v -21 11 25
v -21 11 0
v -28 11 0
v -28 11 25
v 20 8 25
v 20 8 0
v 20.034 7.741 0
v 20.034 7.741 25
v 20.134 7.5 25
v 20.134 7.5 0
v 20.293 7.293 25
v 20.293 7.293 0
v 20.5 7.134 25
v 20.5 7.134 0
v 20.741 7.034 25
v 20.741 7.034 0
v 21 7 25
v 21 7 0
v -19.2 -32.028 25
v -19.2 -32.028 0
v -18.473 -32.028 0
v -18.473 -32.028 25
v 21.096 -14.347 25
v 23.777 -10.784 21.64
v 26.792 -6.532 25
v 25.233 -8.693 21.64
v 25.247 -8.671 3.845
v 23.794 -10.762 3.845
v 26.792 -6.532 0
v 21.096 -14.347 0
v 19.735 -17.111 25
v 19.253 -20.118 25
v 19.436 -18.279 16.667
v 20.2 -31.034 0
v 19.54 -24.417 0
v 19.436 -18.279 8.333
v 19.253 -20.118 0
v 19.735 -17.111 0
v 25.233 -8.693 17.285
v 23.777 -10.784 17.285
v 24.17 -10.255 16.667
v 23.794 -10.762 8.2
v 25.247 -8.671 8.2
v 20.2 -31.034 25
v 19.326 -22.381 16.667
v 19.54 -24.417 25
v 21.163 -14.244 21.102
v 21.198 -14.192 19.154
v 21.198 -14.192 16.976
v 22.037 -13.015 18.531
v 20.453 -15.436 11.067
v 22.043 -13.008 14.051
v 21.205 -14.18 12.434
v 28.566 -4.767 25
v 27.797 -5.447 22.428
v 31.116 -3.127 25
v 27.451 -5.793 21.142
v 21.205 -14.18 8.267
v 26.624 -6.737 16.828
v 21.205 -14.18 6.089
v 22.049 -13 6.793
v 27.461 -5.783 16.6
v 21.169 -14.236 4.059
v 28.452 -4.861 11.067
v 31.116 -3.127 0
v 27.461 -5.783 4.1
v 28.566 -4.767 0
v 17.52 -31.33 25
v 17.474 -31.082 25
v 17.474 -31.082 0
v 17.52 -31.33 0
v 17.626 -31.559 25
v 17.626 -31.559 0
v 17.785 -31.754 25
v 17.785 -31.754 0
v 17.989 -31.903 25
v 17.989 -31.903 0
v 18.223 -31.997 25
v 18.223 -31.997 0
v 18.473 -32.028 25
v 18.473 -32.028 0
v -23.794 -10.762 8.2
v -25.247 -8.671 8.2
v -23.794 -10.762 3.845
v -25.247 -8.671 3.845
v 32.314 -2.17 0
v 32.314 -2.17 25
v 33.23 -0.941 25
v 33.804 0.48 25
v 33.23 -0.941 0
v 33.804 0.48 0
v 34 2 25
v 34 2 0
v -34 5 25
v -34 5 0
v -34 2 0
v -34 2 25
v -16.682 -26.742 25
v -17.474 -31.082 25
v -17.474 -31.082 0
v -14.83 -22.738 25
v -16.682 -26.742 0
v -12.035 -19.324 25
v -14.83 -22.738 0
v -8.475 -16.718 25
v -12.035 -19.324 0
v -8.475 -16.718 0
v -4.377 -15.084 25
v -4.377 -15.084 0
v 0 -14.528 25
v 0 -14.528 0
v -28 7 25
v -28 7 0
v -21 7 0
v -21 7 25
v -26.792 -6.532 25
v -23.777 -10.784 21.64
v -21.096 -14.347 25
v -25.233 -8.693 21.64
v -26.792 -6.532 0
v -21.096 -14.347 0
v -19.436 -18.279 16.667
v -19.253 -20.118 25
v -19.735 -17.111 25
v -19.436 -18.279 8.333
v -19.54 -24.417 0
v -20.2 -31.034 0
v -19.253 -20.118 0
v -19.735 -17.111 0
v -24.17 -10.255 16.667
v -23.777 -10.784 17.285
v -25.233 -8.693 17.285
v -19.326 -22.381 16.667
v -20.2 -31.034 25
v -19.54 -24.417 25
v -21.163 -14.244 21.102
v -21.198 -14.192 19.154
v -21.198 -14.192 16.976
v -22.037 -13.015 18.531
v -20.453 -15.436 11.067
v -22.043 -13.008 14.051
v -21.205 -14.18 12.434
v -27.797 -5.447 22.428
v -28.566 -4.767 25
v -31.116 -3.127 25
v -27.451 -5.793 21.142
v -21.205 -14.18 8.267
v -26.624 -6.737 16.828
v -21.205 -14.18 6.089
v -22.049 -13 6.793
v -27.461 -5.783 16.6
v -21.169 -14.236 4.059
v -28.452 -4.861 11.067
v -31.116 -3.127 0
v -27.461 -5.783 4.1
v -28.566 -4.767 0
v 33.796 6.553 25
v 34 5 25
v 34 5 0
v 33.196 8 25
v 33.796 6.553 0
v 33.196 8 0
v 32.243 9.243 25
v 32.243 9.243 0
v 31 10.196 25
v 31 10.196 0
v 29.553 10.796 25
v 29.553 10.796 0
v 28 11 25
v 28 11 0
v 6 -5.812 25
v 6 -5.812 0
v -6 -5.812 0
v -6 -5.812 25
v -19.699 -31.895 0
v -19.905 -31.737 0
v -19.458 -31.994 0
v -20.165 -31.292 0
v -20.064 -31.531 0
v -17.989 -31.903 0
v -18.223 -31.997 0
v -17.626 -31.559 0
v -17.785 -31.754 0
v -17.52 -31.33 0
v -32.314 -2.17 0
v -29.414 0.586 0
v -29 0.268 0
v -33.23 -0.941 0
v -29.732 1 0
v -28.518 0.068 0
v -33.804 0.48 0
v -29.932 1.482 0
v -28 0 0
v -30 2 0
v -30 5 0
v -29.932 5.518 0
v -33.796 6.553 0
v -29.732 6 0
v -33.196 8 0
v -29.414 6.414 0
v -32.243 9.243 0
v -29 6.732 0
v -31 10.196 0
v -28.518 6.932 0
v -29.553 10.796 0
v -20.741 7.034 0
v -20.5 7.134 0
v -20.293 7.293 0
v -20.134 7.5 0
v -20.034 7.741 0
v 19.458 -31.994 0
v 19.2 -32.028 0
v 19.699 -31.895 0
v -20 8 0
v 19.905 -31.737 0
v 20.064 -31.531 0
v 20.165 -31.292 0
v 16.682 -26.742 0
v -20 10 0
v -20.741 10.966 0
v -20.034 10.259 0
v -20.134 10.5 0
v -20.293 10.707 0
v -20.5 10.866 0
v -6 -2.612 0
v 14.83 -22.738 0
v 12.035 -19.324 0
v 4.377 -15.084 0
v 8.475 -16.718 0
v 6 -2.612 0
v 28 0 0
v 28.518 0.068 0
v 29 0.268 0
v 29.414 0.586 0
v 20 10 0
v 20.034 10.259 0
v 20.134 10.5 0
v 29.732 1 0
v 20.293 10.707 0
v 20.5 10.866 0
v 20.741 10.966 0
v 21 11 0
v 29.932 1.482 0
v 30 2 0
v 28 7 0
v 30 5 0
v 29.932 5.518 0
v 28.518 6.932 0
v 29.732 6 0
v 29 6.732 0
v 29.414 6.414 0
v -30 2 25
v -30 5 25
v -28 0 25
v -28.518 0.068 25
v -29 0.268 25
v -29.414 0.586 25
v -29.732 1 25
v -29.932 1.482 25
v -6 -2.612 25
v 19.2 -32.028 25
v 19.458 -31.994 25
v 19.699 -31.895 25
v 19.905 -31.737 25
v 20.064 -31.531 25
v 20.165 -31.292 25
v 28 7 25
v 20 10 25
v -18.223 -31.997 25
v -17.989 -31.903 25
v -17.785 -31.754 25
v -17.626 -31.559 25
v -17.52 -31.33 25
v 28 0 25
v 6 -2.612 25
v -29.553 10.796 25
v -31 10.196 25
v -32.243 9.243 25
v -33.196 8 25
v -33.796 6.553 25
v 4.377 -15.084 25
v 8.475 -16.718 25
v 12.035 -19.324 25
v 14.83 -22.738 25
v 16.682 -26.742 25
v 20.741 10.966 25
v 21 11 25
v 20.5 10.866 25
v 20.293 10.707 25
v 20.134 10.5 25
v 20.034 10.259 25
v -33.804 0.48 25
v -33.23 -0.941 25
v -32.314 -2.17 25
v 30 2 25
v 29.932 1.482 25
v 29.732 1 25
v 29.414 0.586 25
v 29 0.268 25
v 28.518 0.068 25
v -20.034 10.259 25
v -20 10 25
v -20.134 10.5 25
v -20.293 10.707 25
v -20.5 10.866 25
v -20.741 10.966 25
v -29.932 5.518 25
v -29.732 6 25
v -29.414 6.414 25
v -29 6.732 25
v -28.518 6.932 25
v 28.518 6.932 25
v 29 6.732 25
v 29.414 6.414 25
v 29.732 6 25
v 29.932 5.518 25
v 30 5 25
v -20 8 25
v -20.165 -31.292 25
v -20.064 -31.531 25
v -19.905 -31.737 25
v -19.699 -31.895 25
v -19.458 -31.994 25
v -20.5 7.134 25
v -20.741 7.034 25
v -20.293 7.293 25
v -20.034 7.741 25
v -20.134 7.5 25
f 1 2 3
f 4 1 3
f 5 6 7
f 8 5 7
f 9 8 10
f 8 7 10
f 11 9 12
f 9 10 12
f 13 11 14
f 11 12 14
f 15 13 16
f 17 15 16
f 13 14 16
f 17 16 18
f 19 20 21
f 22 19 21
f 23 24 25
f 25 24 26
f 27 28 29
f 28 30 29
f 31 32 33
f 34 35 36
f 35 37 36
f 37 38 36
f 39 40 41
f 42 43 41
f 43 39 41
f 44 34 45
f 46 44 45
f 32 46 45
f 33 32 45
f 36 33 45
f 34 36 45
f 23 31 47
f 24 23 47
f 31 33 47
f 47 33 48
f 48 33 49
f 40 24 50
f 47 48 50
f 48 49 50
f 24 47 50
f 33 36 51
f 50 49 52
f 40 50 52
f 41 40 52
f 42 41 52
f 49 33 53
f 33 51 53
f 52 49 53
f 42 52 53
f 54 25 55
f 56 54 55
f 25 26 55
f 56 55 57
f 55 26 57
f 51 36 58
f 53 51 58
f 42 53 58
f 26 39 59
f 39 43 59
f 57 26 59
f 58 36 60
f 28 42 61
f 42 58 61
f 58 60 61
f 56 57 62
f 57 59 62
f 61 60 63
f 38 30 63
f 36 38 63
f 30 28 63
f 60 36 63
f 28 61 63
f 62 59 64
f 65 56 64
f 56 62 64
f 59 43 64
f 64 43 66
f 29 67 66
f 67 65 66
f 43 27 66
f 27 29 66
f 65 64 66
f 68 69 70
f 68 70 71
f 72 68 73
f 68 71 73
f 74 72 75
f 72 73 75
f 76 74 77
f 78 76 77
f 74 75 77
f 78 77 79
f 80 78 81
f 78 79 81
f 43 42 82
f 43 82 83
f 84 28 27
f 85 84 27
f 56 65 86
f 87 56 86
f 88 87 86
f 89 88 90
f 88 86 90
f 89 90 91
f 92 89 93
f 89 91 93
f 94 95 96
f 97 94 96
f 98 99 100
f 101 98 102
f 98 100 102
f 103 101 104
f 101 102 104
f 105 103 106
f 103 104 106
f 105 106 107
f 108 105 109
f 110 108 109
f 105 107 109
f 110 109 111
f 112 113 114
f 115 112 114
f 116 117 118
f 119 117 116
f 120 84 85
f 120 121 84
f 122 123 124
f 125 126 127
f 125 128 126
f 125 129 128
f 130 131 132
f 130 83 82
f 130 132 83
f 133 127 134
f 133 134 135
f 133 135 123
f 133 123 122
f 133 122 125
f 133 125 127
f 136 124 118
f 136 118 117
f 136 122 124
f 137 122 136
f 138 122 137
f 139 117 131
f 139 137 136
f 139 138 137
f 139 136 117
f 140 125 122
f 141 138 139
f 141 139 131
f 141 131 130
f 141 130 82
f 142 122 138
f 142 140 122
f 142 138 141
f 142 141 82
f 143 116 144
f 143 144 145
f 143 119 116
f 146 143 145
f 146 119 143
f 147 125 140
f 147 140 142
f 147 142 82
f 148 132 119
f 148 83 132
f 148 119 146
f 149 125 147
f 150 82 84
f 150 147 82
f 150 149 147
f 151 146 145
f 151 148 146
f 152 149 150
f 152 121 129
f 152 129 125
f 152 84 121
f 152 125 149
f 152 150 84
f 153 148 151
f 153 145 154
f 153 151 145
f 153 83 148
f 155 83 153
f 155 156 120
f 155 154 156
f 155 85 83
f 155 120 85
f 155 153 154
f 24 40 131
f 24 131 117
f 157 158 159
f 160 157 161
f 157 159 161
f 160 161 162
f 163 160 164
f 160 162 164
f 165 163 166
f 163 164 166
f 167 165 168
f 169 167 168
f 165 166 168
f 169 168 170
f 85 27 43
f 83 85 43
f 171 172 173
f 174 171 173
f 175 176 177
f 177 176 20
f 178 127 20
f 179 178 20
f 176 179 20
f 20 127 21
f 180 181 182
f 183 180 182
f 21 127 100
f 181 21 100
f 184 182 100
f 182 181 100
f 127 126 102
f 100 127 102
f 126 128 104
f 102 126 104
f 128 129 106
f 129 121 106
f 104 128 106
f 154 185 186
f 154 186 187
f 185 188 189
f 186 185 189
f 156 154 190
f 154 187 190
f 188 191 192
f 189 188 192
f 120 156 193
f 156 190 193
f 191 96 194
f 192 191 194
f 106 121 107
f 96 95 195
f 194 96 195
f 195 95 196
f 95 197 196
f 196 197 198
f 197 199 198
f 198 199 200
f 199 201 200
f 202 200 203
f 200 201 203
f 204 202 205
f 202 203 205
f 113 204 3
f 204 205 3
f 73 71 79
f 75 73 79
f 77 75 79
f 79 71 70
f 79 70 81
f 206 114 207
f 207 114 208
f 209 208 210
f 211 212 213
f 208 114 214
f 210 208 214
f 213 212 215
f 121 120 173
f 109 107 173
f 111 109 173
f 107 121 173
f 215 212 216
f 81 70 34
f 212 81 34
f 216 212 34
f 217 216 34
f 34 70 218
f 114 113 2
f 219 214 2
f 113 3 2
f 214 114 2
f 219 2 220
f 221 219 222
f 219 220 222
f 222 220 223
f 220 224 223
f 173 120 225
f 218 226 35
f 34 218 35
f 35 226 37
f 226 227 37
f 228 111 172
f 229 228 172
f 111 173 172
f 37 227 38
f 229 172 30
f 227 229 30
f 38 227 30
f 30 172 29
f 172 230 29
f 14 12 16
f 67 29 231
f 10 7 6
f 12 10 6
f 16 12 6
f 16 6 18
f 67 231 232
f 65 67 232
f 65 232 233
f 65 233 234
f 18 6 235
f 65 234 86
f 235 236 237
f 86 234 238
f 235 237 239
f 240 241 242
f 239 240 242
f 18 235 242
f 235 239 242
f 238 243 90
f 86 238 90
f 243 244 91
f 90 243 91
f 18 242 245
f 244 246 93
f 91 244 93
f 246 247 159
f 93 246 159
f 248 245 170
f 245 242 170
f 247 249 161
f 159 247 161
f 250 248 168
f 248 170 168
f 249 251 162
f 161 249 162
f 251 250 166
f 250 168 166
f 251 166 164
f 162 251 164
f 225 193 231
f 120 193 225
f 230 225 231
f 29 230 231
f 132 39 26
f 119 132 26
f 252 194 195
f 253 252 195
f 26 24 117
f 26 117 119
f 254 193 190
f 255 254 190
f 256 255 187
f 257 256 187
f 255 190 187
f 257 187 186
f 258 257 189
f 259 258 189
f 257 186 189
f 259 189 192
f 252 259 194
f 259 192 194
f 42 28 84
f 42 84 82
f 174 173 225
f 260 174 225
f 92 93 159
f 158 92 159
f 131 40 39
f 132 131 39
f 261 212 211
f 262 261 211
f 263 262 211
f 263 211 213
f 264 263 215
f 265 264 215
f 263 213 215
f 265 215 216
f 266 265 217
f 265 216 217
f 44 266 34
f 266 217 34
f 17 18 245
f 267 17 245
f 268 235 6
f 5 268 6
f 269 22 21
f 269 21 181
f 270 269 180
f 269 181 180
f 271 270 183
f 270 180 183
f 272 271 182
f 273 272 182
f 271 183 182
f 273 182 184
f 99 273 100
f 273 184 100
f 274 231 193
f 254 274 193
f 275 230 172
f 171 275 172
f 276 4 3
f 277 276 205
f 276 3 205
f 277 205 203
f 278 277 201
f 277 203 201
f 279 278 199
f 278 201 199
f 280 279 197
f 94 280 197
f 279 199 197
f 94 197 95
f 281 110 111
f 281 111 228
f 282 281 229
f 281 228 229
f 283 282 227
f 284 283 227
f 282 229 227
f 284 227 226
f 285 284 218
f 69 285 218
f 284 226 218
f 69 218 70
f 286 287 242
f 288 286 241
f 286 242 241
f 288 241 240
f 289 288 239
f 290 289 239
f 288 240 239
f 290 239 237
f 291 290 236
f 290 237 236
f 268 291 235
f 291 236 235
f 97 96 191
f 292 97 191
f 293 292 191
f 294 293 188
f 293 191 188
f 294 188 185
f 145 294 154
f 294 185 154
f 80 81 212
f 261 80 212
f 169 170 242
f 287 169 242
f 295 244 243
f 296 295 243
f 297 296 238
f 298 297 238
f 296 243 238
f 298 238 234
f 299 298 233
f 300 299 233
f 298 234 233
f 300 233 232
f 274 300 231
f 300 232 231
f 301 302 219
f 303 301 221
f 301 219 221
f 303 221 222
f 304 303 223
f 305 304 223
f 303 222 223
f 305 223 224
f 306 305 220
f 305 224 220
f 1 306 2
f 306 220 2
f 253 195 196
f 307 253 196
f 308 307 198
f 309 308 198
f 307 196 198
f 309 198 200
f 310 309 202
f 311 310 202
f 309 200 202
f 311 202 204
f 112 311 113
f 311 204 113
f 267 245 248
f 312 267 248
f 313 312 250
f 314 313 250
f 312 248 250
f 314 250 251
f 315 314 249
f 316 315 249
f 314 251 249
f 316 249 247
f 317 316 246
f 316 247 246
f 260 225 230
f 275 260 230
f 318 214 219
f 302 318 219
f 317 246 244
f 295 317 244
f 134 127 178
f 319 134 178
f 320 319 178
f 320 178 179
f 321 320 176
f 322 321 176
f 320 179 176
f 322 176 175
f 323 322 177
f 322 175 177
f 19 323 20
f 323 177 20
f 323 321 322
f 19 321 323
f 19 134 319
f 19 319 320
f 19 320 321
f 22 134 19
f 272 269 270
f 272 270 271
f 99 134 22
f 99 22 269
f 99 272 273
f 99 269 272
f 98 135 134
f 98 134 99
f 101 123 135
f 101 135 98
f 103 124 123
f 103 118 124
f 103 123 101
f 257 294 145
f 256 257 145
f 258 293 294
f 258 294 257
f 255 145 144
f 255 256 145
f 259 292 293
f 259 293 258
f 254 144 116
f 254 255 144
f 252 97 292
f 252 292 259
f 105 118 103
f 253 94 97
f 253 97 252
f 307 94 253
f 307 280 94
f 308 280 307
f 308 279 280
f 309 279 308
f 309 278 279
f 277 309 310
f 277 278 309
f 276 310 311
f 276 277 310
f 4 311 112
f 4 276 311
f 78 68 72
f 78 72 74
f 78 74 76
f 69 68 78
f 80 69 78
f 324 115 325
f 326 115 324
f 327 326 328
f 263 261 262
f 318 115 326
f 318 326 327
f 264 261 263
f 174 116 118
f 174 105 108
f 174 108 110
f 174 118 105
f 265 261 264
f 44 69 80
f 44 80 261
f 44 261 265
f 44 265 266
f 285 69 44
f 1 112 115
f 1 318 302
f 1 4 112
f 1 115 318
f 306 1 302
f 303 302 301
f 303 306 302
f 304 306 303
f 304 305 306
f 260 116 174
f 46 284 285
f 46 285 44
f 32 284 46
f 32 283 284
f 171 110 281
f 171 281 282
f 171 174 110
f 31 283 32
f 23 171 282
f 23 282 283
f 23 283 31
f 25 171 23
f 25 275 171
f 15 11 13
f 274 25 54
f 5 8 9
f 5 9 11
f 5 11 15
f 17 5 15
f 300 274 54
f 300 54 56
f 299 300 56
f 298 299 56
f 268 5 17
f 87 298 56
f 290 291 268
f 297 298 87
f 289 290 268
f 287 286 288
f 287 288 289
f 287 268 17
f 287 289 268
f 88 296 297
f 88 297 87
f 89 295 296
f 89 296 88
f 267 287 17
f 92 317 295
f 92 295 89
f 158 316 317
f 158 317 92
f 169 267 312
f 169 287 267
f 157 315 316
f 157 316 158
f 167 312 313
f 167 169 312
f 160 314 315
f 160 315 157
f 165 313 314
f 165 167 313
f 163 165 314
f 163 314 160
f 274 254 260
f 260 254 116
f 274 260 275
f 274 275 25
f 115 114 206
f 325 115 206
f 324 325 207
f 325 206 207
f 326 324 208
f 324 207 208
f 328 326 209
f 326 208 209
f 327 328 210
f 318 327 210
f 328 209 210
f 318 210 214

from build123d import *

# Parameters (mm, degrees)
F1_DEPTH      = 25
F3_W          = 2.0907083526
F3_H          = 4.3556410819
F4_DEPTH      = 59.0010001
F4_DEPTH_BACK = 25


with BuildPart() as f1:
    # F0 (on Top) → F1 (new body)
    with BuildSketch(Plane.XY):
        with BuildLine():
            Line((28, 0), (0, 0))
            Line((0, 0), (-28, 0))
            ThreePointArc((-28, 0), (-29.4142135624, 0.5857864376), (-30, 2))
            Line((-30, 2), (-30, 5))
            ThreePointArc((-30, 5), (-29.4142135624, 6.4142135624), (-28, 7))
            Line((-28, 7), (-21, 7))
            ThreePointArc((-21, 7), (-20.2928932188, 7.2928932188), (-20, 8))
            Line((-20, 8), (-20, 10))
            ThreePointArc((-20, 10), (-20.2928932188, 10.7071067812), (-21, 11))
            Line((-21, 11), (-28, 11))
            ThreePointArc((-28, 11), (-32.2426406871, 9.2426406871), (-34, 5))
            Line((-34, 5), (-34, 2))
            ThreePointArc((-34, 2), (-33.2295778289, -0.9413459047), (-31.116161423, -3.1273324435))
            add(Edge.make_bspline(
                [(-20.2002647828, -31.033764074), (-20.2216697913, -27.1145849984), (-17.4005191837, -17.4814529394), (-24.9095102489, -10.2786252936), (-27.0259722507, -5.2164699757), (-31.116161423, -3.1273324435)],
                knots=[0.0299386357, 0.0299386357, 0.0299386357, 0.0299386357, 0.374142378, 0.6819001297, 1, 1, 1, 1], degree=3))
            ThreePointArc((-20.2002647828, -31.033764074), (-19.9054528943, -31.7373376424), (-19.200279697, -32.0283025503))
            Line((-19.200279697, -32.0283025503), (-18.4729532019, -32.0283025503))
            ThreePointArc((-18.4729532019, -32.0283025503), (-17.7852228965, -31.7542688216), (-17.474415191, -31.0823566044))
            ThreePointArc((-17.474415191, -31.0823566044), (-12.0352803446, -19.323892803), (0, -14.5283025503))
            ThreePointArc((0, -14.5283025503), (12.0352803446, -19.323892803), (17.474415191, -31.0823566044))
            ThreePointArc((17.474415191, -31.0823566044), (17.7852228965, -31.7542688216), (18.4729532019, -32.0283025503))
            Line((18.4729532019, -32.0283025503), (19.200279697, -32.0283025503))
            ThreePointArc((19.200279697, -32.0283025503), (19.9054528943, -31.7373376424), (20.2002647828, -31.033764074))
            add(Edge.make_bspline(
                [(20.2002647828, -31.033764074), (20.2216697913, -27.1145849984), (17.4005191837, -17.4814529394), (24.9095102489, -10.2786252936), (27.0259722507, -5.2164699757), (31.116161423, -3.1273324435)],
                knots=[0.0299386357, 0.0299386357, 0.0299386357, 0.0299386357, 0.374142378, 0.6819001297, 1, 1, 1, 1], degree=3))
            ThreePointArc((31.116161423, -3.1273324435), (33.2295778289, -0.9413459047), (34, 2))
            Line((34, 2), (34, 5))
            ThreePointArc((34, 5), (32.2426406871, 9.2426406871), (28, 11))
            Line((28, 11), (21, 11))
            ThreePointArc((21, 11), (20.2928932188, 10.7071067812), (20, 10))
            Line((20, 10), (20, 8))
            ThreePointArc((20, 8), (20.2928932188, 7.2928932188), (21, 7))
            Line((21, 7), (28, 7))
            ThreePointArc((28, 7), (29.4142135624, 6.4142135624), (30, 5))
            Line((30, 5), (30, 2))
            ThreePointArc((30, 2), (29.4142135624, 0.5857864376), (28, 0))
        make_face()
        Polygon((-6, -2.6120110326), (0, -2.6120110326), (6, -2.6120110326), (6, -5.8120110326), (-6, -5.8120110326), align=None, mode=Mode.SUBTRACT)
    extrude(amount=F1_DEPTH)

    # F3 (on offset) → F4 (cut, two sides)
    with BuildSketch(Plane.YZ.offset(25)) as f4_sk:
        with Locations((-9.738416411, 19.4626431912)):
            Rectangle(F3_W, F3_H)
        with Locations((-9.7166006453, 6.0226437636)):
            Rectangle(F3_W, F3_H)
    extrude(amount=-F4_DEPTH, mode=Mode.SUBTRACT)
    extrude(f4_sk.sketch, amount=F4_DEPTH_BACK, mode=Mode.SUBTRACT)


solid = f1.part
